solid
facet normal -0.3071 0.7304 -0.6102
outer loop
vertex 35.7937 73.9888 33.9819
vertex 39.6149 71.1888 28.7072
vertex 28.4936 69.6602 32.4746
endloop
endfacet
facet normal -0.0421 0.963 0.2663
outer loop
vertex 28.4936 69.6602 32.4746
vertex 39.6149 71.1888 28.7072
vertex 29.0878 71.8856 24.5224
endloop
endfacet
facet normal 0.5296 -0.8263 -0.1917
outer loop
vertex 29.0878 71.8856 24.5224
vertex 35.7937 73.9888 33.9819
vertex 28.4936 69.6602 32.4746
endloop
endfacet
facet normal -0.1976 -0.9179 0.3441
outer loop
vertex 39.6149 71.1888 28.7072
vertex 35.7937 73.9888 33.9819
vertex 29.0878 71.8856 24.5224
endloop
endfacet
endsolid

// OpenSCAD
// Auto-generated auxetic polyhedron
points = [
    [28.493637, 69.660155, 32.474624],
    [39.614894, 71.188749, 28.707194],
    [35.793720, 73.988760, 33.981896],
    [29.087790, 71.885629, 24.522450],
];

faces = [
    [0, 1, 2],
    [3, 1, 0],
    [0, 2, 3],
    [3, 2, 1],
];

polyhedron(points = points, faces = faces);
